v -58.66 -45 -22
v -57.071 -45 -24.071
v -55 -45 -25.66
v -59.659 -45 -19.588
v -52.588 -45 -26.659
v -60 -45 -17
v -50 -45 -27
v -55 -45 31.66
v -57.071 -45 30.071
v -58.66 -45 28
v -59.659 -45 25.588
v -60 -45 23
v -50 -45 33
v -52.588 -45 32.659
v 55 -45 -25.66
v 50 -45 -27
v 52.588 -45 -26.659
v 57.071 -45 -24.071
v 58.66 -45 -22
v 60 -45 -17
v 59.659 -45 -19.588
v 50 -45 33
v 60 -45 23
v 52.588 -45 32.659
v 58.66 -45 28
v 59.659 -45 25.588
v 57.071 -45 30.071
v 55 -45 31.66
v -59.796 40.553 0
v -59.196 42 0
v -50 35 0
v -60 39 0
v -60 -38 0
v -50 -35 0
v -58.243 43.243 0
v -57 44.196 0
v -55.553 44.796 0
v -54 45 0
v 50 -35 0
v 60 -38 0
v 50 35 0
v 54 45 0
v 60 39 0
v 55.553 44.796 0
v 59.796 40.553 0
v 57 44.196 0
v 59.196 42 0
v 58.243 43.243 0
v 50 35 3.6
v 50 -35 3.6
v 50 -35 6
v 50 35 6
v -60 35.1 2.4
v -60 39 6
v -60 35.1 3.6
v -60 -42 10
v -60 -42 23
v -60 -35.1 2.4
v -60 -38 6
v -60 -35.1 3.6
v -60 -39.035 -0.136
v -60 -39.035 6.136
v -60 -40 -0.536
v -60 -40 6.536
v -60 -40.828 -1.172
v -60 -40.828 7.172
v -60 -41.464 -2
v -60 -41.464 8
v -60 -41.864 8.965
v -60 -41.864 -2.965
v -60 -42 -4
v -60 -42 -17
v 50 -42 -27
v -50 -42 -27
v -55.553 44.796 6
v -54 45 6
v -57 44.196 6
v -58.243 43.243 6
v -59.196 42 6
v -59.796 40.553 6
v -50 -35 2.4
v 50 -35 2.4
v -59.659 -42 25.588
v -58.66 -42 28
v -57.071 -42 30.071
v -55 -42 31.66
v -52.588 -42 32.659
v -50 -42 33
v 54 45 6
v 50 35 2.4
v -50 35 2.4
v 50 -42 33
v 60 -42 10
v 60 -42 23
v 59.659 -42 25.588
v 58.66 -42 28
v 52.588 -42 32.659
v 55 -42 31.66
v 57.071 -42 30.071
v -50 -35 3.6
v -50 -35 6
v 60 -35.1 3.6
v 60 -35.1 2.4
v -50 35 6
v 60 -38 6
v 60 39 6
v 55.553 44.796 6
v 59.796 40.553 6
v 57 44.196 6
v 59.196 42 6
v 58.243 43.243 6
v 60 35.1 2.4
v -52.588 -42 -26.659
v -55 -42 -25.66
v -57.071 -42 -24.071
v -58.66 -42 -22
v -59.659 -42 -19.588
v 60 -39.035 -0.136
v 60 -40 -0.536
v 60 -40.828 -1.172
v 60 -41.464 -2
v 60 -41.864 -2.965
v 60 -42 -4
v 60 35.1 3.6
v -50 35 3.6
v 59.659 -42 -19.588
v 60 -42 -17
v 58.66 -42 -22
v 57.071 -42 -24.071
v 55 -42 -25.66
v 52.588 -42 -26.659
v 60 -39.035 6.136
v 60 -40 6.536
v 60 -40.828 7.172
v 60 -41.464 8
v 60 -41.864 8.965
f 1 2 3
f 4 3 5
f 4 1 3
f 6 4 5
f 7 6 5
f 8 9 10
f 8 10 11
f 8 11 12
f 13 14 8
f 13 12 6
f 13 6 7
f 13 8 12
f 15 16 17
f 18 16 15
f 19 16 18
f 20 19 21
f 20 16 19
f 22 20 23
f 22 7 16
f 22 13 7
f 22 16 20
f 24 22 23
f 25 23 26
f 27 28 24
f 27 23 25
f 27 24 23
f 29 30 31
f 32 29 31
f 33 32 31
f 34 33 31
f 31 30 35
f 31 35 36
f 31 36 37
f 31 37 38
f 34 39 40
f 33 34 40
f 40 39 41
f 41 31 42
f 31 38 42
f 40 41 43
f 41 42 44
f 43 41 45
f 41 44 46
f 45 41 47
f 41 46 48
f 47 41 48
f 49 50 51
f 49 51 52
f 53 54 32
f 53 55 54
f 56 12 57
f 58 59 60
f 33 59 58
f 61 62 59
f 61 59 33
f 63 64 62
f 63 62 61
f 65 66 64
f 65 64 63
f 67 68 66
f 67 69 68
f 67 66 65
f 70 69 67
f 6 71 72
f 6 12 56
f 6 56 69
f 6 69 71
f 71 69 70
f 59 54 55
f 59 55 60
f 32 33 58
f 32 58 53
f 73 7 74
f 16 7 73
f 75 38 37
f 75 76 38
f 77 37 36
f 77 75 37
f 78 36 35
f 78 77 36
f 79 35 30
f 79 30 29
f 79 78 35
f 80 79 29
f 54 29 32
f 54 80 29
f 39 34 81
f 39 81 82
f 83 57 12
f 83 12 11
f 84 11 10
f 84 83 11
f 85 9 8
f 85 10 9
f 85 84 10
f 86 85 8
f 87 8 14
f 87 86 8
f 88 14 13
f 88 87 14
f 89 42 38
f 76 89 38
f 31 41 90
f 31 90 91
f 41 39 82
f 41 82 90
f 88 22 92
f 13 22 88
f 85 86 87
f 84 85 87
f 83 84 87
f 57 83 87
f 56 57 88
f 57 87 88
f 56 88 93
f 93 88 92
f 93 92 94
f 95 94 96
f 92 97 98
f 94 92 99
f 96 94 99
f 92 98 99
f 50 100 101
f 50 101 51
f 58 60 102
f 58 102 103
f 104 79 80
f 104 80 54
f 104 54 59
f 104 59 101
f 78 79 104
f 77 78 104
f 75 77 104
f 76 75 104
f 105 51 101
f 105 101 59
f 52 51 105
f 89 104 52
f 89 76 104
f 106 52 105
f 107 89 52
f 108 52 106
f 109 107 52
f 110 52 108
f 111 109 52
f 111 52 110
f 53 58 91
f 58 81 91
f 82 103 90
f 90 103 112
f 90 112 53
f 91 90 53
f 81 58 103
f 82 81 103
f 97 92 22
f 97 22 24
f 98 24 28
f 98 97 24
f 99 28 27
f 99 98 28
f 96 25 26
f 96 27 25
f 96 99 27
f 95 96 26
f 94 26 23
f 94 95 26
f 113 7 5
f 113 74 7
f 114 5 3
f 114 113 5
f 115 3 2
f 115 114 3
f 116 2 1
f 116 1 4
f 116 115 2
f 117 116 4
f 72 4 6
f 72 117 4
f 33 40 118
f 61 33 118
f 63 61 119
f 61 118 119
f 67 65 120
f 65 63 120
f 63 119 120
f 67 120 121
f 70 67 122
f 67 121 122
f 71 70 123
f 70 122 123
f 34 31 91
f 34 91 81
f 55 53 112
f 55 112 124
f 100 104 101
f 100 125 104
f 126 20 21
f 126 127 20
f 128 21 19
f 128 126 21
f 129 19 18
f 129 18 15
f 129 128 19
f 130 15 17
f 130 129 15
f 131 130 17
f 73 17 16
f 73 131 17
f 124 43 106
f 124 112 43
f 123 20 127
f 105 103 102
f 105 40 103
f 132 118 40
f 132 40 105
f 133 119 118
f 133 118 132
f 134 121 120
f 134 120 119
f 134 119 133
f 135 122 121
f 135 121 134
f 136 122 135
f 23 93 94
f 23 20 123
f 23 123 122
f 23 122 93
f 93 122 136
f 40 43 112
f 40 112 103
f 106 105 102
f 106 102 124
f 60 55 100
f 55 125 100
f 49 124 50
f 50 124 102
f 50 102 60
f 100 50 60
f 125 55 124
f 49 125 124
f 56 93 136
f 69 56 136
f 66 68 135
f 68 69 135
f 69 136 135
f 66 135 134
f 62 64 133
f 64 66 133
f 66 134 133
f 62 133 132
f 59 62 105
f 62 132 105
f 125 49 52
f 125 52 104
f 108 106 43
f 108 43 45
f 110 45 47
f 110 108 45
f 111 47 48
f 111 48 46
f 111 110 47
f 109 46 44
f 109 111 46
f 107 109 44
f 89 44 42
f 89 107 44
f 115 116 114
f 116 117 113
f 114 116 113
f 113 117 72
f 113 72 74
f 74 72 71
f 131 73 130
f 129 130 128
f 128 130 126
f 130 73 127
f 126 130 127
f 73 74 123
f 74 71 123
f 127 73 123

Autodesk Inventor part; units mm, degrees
ref_plane "YZ Plane" through (0, 0, 0) normal (1, 0, 0) x (0, 1, 0)
ref_plane "XZ Plane" through (0, 0, 0) normal (0, 1, 0) x (-1, 0, 0)
ref_plane "XY Plane" through (0, 0, 0) normal (0, 0, 1) x (1, 0, 0)
sketch "Sketch1" plane through (0, 0, 0) normal (0, 0, 1) x (1, 0, 0)
  line L0 (-60, -45) -> (60, -45)
  line L1 (60, -45) -> (60, 45)
  line L2 (60, 45) -> (-60, 45)
  line L3 (-60, 45) -> (-60, -45)
  line L4 (-60, -45) -> (60, 45) construction
  line L5 (60, -45) -> (-60, 45) construction
  line L6 (-50, -35) -> (50, -35)
  line L7 (50, -35) -> (50, 35)
  line L8 (50, 35) -> (-50, 35)
  line L9 (-50, 35) -> (-50, -35)
  line L10 (-50, -35) -> (50, 35) construction
  line L11 (50, -35) -> (-50, 35) construction
  point P0 (0, 0)
  dimension "d0" = 120
  dimension "d1" = 90
  dimension "d2" = 100
  dimension "d3" = 70
extrude "Extrusion1" add sketch "Sketch1" along normal blind 6
sketch "Sketch2" plane through (60, -45, 0) normal (1, 0, 0) x (0, 0, -1)
  line L0 (0, 0) -> (0, 90) projected
  line L1 (0, 90) -> (-6, 90) projected
  line L2 (-6, 0) -> (-6, 90) projected
  line L3 (0, 0) -> (-6, 0) projected
  line L4 (0, 45) -> (-3, 45)
  line L5 (-3.6, 9.9) -> (-2.4, 9.9)
  line L6 (-2.4, 9.9) -> (-2.4, 80.1)
  line L7 (-2.4, 80.1) -> (-3.6, 80.1)
  line L8 (-3.6, 80.1) -> (-3.6, 9.9)
  line L9 (-3.6, 9.9) -> (-2.4, 80.1) construction
  line L10 (-2.4, 9.9) -> (-3.6, 80.1) construction
  dimension "d6" = 3
  dimension "d7" = 1.2
  dimension "d8" = 70.2
extrude "Extrusion2" cut sketch "Sketch2" against normal blind 120 contours L6 L5 L8 L7
sketch "Sketch3" plane through (-60, -45, 0) normal (0, -1, 0) x (1, 0, 0)
  line L0 (60, 0) -> (60, 3)
  line L1 (120, 33) -> (0, 33)
  line L2 (0, 33) -> (0, -27)
  line L3 (0, -27) -> (120, -27)
  line L4 (120, -27) -> (120, 33)
  line L5 (120, 33) -> (0, -27) construction
  line L6 (0, 33) -> (120, -27) construction
  dimension "d11" = 3
  dimension "d12" = 120
  dimension "d13" = 60
extrude "Extrusion3" add sketch "Sketch3" against normal blind 3
fillet "Fillet1" radius 4 2 edges at (0, -42, 6) (0, -42, 0)
fillet "Fillet2" radius 6 2 edges at (-60, 45, 3) (60, 45, 3)
fillet "Fillet3" radius 10 4 edges at (60, -43.5, 33) (60, -43.5, -27) (-60, -43.5, 33) (-60, -43.5, -27)
equation "\"d0\" = tot_w"
equation "\"d1\" = tot_h"
equation "\"d2\" = window_width"
equation "\"d3\" = window_height"
equation "\"d4\" = tot_t"
equation "\"d6\" = 0.5 * tot_t"
equation "\"d7\" = t + 2 * offset"
equation "\"d8\" = window_height + 2 * offset"
equation "\"d9\" = tot_w"
equation "\"d11\" = 0.5 * tot_t"
equation "\"d12\" = tot_w"
equation "\"d13\" = base_w"
equation "\"window_width\" = 100"
equation "\"window_height\" = 70"
equation "\"t\" = 1"
equation "\"offset\" = 0.1"
equation "\"tot_t\" = 6"
equation "\"tot_w\" = 120"
equation "\"tot_h\" = 90"
equation "\"base_w\" = 60"
properties part number "light_frame_v1"
